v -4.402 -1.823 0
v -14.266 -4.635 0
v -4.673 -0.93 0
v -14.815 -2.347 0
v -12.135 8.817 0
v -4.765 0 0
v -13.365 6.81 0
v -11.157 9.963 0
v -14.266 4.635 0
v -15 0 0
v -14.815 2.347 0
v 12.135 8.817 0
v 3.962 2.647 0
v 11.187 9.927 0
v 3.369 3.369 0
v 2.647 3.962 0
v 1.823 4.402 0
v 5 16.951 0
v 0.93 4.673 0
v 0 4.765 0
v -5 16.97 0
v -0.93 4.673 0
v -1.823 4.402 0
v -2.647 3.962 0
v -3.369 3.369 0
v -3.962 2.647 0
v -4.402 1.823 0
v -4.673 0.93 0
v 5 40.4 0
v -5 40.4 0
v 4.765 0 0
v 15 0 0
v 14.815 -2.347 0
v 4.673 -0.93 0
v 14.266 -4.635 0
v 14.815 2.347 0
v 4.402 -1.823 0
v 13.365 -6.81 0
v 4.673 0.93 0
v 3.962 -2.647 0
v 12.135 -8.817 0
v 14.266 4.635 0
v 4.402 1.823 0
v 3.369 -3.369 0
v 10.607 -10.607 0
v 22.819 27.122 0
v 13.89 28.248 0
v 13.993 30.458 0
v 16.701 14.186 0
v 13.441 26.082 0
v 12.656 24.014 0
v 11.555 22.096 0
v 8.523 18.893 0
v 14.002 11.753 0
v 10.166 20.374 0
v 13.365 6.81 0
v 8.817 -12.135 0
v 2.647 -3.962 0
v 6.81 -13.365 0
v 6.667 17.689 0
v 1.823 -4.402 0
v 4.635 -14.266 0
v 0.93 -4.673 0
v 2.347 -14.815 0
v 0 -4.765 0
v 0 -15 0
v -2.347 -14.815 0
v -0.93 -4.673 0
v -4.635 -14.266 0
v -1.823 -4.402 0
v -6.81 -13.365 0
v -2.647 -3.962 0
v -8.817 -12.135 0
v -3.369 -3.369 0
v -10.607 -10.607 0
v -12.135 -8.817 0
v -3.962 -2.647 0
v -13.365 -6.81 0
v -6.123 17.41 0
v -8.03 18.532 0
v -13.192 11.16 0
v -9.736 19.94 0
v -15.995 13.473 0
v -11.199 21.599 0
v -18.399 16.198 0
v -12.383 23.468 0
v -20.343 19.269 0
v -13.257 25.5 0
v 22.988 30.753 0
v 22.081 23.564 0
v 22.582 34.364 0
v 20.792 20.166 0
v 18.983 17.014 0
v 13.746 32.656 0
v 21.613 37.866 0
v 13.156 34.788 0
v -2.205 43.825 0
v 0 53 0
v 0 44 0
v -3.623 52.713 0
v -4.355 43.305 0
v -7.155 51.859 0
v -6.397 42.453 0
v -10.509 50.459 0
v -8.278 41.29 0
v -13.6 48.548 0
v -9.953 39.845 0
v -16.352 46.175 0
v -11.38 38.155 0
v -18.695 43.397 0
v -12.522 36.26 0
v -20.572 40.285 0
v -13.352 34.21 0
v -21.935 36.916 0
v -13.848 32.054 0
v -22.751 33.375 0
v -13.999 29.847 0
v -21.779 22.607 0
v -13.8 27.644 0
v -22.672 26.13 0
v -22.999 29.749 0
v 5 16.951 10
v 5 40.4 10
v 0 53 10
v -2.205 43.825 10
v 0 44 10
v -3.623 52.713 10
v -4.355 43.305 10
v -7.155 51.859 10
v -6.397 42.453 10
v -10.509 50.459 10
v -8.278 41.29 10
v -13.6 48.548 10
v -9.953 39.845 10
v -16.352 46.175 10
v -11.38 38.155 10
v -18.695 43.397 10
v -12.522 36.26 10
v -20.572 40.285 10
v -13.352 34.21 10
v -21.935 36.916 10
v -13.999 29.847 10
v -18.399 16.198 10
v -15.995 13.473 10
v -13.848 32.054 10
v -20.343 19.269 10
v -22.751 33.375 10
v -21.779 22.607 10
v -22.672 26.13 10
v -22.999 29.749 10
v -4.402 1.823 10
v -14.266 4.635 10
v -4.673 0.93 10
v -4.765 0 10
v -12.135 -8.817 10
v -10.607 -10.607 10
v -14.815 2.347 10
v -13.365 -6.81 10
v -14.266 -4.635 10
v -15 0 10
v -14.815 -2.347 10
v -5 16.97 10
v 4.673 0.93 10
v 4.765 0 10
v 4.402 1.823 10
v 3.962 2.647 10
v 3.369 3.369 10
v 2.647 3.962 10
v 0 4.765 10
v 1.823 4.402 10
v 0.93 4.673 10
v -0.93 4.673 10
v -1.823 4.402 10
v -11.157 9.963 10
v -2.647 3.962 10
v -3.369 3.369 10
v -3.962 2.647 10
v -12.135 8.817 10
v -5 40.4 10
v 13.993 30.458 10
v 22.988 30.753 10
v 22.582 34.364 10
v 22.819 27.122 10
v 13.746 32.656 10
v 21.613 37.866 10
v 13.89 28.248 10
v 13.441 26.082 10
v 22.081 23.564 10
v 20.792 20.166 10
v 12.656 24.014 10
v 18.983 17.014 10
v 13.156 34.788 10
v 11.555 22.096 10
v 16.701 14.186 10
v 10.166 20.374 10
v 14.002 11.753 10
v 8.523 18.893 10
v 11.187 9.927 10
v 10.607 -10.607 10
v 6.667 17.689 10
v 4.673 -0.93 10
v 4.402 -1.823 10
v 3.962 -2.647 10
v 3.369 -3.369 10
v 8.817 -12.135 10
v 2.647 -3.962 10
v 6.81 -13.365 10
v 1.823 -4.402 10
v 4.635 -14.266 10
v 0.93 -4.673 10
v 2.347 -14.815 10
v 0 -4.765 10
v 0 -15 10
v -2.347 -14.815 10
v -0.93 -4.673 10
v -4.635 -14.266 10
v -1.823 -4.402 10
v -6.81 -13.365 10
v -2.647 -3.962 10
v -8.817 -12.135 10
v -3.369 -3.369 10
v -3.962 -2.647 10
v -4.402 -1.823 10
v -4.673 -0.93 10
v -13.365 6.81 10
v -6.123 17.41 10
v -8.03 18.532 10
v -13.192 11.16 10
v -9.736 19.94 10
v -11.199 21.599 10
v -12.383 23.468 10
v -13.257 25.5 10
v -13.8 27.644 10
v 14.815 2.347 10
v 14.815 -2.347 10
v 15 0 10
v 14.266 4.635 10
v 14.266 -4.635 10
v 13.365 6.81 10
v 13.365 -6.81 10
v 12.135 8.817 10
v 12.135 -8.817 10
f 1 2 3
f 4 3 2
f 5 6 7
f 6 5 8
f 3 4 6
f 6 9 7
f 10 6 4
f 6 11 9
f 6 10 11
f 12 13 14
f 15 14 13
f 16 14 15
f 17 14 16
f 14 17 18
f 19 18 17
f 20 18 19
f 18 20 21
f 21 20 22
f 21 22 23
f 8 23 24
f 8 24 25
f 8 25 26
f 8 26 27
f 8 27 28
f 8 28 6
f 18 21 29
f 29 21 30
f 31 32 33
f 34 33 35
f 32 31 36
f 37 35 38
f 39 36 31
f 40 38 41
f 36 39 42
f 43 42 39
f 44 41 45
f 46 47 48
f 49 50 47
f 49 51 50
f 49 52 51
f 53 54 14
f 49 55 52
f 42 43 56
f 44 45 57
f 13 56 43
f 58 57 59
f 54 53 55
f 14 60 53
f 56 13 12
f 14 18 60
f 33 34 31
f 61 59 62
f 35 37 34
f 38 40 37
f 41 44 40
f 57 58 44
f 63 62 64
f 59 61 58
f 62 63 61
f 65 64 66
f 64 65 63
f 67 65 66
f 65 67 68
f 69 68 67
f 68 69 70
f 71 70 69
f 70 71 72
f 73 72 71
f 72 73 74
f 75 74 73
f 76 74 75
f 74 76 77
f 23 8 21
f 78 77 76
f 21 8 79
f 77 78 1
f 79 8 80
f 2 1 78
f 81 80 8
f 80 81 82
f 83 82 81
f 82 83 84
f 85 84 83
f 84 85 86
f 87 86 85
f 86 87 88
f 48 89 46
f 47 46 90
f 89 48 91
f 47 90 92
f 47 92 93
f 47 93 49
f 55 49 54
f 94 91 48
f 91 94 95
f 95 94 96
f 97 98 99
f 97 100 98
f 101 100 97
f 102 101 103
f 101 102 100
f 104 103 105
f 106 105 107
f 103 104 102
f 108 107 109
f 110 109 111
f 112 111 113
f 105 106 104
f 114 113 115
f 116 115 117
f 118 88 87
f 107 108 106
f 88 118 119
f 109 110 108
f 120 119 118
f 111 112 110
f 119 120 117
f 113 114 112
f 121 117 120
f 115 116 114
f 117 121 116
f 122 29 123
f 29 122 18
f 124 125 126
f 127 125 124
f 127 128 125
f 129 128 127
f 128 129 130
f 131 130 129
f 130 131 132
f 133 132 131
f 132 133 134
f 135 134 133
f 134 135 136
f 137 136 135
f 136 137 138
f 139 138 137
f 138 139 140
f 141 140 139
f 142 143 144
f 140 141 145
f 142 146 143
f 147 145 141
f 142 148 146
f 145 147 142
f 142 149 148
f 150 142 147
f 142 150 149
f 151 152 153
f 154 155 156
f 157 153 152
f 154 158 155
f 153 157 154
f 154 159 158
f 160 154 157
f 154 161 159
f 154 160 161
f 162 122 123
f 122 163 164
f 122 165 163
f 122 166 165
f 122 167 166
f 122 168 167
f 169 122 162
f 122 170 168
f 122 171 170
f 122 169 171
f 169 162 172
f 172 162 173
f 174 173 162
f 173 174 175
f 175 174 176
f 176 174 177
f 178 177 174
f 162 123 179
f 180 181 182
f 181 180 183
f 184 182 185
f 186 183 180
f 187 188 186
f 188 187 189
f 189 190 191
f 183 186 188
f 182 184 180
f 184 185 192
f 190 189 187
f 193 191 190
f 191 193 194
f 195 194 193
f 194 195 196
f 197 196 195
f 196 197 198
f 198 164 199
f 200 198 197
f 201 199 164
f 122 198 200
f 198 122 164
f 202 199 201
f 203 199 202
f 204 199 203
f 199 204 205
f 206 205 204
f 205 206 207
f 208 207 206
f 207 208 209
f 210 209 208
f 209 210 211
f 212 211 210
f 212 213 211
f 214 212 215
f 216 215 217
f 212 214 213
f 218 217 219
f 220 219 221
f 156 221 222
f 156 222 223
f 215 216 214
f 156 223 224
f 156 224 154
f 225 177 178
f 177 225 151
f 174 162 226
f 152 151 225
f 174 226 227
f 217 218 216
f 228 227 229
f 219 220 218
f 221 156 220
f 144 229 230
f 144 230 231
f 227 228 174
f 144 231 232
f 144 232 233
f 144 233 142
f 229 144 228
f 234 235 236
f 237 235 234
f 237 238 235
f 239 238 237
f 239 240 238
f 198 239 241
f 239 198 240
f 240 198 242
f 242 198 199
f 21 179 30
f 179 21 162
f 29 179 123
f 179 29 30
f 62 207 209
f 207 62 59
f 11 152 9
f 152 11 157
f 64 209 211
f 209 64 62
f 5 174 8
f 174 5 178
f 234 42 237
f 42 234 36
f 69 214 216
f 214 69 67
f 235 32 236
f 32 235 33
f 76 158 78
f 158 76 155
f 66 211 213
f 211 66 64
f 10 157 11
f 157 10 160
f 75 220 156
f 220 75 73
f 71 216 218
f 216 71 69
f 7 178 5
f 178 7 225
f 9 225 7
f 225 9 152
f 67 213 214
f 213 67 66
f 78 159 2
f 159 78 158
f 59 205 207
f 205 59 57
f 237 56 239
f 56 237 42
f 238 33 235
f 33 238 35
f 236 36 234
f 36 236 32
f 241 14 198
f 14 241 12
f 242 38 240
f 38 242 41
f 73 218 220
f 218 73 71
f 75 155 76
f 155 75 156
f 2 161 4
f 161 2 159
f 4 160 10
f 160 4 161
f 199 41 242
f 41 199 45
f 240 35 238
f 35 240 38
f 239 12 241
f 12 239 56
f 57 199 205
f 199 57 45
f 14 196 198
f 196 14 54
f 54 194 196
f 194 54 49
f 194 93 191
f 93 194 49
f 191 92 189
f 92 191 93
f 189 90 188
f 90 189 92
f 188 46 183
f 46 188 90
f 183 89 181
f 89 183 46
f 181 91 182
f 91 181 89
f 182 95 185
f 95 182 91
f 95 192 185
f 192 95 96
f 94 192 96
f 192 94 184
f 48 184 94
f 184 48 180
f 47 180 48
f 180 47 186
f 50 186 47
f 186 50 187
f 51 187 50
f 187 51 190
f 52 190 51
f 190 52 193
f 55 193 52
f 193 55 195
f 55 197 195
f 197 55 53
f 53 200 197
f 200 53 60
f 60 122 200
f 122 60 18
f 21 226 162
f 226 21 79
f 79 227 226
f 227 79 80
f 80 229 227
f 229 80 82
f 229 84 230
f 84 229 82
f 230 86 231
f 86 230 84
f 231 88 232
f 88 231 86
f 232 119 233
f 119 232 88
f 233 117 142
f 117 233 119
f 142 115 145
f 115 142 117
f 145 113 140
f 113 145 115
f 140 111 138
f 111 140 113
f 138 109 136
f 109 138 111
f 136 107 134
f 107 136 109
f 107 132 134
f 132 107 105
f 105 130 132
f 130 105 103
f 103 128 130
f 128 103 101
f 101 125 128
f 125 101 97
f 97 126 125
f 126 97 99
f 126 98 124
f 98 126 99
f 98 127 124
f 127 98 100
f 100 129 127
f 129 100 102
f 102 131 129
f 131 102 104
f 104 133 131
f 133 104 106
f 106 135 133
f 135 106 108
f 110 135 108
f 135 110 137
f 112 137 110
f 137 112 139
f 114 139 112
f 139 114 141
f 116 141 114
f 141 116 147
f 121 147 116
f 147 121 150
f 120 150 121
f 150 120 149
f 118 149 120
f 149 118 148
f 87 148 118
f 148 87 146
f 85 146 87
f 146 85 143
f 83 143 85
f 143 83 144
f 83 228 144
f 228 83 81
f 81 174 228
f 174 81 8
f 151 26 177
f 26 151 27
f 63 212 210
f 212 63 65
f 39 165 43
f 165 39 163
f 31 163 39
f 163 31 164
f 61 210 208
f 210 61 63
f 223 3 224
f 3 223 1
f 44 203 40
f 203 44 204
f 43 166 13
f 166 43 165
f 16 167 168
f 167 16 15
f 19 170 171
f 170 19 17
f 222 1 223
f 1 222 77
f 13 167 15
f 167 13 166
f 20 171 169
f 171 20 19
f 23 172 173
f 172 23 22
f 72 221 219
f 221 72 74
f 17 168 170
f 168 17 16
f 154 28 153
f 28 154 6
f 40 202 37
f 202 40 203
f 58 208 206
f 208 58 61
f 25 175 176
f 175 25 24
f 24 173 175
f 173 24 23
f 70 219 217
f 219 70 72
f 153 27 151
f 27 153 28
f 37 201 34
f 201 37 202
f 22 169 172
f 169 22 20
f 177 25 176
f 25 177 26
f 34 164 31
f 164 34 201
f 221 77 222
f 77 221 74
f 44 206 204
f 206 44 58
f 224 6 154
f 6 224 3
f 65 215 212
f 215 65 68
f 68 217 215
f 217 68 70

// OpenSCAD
$fn = 32;

// ----------------------------------------------------------------------
// Hook: 60 mm shank into a 14 mm curl, 10 mm thick
// ----------------------------------------------------------------------

// --- parameters (mm) ---
shank_len = 60;           // shank length from the boss centre
shank_w = 10;             // shank width
boss_d = 30;              // boss diameter
bore_d = 9.53;            // boss bore
curl_in = 14;             // curl inner radius
curl_out = 23;            // curl outer radius
curl_sweep = 290;         // curl sweep angle
hook_t = 10;              // hook thickness

shank_profile = [[-5, 40.4], [5, 40.4], [5, 13], [-5, 13]];
boss_profile = [[15, 0], [14.815, 2.347], [14.266, 4.635], [13.365, 6.81], [12.135, 8.817], [10.607, 10.607], [8.817, 12.135], [6.81, 13.365], [4.635, 14.266], [2.347, 14.815], [0, 15], [-2.347, 14.815], [-4.635, 14.266], [-6.81, 13.365], [-8.817, 12.135], [-10.607, 10.607], [-12.135, 8.817], [-13.365, 6.81], [-14.266, 4.635], [-14.815, 2.347], [-15, 0], [-14.815, -2.347], [-14.266, -4.635], [-13.365, -6.81], [-12.135, -8.817], [-10.607, -10.607], [-8.817, -12.135], [-6.81, -13.365], [-4.635, -14.266], [-2.347, -14.815], [0, -15], [2.347, -14.815], [4.635, -14.266], [6.81, -13.365], [8.817, -12.135], [10.607, -10.607], [12.135, -8.817], [13.365, -6.81], [14.266, -4.635], [14.815, -2.347]];
curl_profile = [[0, 53], [-3.623, 52.713], [-7.155, 51.859], [-10.509, 50.459], [-13.6, 48.548], [-16.352, 46.175], [-18.695, 43.397], [-20.572, 40.285], [-21.935, 36.916], [-22.751, 33.375], [-22.999, 29.749], [-22.672, 26.13], [-21.779, 22.607], [-20.343, 19.269], [-18.399, 16.198], [-15.995, 13.473], [-13.192, 11.16], [-10.06, 9.317], [-6.677, 7.99], [-3.126, 7.213], [0.502, 7.005], [4.117, 7.372], [7.63, 8.303], [10.953, 9.775], [14.002, 11.753], [16.701, 14.186], [18.983, 17.014], [20.792, 20.166], [22.081, 23.564], [22.819, 27.122], [22.988, 30.753], [22.582, 34.364], [21.613, 37.866], [13.156, 34.788], [13.746, 32.656], [13.993, 30.458], [13.89, 28.248], [13.441, 26.082], [12.656, 24.014], [11.555, 22.096], [10.166, 20.374], [8.523, 18.893], [6.667, 17.689], [4.644, 16.793], [2.506, 16.226], [0.305, 16.003], [-1.903, 16.13], [-4.064, 16.603], [-6.123, 17.41], [-8.03, 18.532], [-9.736, 19.94], [-11.199, 21.599], [-12.383, 23.468], [-13.257, 25.5], [-13.8, 27.644], [-13.999, 29.847], [-13.848, 32.054], [-13.352, 34.21], [-12.522, 36.26], [-11.38, 38.155], [-9.953, 39.845], [-8.278, 41.29], [-6.397, 42.453], [-4.355, 43.305], [-2.205, 43.825], [0, 44]];

difference() {
  union() {
    /* three overlapping outlines: shank, boss and the smooth curl */
    linear_extrude(height = hook_t) polygon(shank_profile);
    linear_extrude(height = hook_t) polygon(boss_profile);
    linear_extrude(height = hook_t) polygon(curl_profile);
  }
  translate([0, 0, -2.5]) cylinder(h = hook_t + 5, d = bore_d);
}
